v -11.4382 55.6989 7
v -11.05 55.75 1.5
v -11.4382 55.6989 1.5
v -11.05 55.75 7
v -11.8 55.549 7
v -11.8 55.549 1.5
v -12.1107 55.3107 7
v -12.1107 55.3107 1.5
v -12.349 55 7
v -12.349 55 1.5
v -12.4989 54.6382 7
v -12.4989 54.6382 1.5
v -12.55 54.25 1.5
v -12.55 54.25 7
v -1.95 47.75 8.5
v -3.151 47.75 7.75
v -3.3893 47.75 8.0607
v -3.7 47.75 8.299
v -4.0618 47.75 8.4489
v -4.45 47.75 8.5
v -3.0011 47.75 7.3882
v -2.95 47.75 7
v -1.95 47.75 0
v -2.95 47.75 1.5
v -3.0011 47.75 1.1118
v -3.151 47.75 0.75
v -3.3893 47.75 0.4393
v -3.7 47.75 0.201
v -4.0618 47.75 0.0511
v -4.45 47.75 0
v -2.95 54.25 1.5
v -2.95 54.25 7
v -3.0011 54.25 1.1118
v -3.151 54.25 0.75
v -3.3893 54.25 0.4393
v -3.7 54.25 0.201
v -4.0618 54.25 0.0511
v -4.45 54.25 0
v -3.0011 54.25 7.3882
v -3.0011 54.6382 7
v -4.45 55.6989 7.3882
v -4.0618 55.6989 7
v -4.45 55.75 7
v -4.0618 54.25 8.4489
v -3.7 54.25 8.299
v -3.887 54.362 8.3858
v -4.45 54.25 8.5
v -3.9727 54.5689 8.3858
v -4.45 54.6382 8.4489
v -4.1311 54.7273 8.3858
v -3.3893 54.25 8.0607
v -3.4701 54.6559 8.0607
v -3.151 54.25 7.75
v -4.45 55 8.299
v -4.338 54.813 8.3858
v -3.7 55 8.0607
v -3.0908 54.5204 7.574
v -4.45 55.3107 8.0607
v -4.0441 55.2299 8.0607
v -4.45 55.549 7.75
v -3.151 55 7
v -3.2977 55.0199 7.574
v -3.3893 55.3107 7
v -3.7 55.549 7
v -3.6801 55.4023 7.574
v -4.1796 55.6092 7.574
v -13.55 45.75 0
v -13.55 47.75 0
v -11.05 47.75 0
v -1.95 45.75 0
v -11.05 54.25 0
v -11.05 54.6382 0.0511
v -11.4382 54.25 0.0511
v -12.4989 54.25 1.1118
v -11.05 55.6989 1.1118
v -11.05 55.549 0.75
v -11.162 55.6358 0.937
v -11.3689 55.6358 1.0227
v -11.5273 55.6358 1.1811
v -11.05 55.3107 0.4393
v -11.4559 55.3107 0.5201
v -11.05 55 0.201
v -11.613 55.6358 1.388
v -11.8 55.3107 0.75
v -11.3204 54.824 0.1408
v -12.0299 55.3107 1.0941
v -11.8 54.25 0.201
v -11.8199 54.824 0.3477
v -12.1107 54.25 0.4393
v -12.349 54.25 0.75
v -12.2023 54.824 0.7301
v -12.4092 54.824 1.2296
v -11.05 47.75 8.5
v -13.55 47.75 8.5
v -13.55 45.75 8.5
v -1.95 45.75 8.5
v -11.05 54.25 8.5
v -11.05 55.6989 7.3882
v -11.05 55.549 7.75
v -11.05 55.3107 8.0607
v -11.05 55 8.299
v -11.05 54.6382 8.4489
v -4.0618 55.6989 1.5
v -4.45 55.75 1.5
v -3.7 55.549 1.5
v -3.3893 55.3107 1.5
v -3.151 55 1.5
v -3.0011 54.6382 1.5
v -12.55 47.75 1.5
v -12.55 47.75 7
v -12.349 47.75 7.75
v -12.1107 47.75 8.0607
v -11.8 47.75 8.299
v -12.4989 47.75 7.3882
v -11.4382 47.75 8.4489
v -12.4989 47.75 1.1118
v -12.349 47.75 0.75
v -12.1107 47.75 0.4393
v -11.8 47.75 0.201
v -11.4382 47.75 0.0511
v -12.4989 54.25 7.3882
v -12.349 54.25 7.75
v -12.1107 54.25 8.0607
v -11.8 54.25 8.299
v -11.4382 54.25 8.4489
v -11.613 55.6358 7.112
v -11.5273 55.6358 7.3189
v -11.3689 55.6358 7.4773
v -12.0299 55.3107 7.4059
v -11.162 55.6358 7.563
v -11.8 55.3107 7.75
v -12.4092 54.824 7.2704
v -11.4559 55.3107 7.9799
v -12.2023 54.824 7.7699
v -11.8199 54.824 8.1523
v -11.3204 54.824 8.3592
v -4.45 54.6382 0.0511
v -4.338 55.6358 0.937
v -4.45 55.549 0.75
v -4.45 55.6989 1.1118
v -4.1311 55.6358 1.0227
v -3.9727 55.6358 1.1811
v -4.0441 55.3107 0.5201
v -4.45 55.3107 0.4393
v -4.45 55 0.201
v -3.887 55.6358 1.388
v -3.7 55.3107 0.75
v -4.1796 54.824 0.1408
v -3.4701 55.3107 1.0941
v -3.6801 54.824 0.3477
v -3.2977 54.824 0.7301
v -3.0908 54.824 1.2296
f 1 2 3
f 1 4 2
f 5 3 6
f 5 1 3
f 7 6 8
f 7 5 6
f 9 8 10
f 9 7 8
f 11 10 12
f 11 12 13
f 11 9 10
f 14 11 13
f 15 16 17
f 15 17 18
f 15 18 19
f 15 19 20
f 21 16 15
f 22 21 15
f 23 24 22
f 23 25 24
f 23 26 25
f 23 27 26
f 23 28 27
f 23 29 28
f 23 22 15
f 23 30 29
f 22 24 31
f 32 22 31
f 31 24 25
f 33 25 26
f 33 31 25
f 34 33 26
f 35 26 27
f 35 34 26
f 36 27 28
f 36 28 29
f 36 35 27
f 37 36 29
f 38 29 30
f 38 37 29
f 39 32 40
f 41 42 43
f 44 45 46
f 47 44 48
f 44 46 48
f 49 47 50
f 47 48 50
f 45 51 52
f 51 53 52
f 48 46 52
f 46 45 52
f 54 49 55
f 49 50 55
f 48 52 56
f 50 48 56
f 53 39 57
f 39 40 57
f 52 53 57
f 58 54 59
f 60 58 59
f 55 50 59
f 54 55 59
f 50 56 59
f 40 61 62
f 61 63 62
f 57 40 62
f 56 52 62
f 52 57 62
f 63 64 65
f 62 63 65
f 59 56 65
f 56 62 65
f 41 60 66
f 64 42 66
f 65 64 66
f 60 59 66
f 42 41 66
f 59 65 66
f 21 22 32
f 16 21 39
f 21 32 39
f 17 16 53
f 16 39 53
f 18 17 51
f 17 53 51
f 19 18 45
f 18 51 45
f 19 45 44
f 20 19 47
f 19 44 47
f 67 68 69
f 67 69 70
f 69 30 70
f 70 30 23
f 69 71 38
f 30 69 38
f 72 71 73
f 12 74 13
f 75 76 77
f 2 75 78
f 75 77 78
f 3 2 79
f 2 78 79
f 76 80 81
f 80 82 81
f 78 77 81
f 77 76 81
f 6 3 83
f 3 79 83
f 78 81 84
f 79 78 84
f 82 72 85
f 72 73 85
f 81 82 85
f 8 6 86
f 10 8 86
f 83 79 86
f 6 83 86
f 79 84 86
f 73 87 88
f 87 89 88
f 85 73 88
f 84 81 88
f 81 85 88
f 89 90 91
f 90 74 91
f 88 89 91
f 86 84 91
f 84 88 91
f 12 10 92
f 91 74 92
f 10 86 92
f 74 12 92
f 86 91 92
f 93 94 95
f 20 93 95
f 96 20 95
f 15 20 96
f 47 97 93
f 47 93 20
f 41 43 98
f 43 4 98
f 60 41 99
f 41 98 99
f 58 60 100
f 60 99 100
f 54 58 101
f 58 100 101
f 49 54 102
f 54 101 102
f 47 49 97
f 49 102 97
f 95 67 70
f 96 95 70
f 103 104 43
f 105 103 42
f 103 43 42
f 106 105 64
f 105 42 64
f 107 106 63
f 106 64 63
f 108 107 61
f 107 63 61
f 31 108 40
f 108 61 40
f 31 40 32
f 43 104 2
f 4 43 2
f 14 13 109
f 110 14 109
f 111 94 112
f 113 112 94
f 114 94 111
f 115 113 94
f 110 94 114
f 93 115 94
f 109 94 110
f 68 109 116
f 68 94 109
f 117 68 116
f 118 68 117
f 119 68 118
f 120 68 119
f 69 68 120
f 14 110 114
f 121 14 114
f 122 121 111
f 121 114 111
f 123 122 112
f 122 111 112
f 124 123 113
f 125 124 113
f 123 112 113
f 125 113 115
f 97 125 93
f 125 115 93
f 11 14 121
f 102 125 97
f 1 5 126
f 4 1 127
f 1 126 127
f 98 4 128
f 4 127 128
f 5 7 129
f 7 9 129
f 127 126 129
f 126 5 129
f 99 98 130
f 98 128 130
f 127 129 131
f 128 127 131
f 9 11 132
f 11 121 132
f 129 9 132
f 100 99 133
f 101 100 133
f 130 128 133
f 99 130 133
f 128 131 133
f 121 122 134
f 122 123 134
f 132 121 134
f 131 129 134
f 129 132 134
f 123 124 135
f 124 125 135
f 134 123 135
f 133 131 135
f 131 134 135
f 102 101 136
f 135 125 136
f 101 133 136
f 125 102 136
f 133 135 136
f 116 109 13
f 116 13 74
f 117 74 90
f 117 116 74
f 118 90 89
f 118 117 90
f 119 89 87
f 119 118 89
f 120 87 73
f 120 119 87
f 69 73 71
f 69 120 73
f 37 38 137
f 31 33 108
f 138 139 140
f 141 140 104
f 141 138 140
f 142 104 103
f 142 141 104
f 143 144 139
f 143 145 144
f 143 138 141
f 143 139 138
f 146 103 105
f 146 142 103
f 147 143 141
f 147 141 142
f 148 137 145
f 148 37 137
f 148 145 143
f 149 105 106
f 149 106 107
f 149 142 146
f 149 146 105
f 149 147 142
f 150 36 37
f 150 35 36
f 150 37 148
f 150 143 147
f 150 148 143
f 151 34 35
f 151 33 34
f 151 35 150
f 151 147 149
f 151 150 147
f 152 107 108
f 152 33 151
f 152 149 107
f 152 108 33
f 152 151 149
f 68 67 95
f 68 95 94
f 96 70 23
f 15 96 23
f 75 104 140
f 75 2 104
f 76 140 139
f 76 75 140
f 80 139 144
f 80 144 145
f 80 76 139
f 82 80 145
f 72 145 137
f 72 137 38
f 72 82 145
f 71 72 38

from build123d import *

# Parameters (mm, degrees)
SKETCH2_W           = 1
SKETCH2_H           = 2
BOSS_EXTRUDE1_DEPTH = 8.5
FILLET1_R           = 1.5


with BuildPart() as part:
    # Sketch2 → Boss-Extrude1 (new body)
    with BuildSketch(Plane.XY):
        Polygon((-2.95, 55.75), (-7.75, 55.75), (-7.75, 45.75), (-2.95, 45.75), (-2.95, 47.75), align=None)
        Polygon((-7.75, 55.75), (-12.55, 55.75), (-12.55, 47.75), (-12.55, 45.75), (-7.75, 45.75), align=None)
        with Locations((-2.45, 46.75)):
            Rectangle(SKETCH2_W, SKETCH2_H)
        with Locations((-13.05, 46.75)):
            Rectangle(SKETCH2_W, SKETCH2_H)
    extrude(amount=BOSS_EXTRUDE1_DEPTH)

    # Fillet1
    fillet1_edges = [part.edges().sort_by_distance(p)[0] for p in [
        (-2.95, 51.75, 0),
        (-12.55, 51.75, 8.5),
        (-12.55, 51.75, 0),
        (-7.75, 55.75, 0),
        (-2.95, 55.75, 4.25),
        (-12.55, 55.75, 4.25),
        (-2.95, 51.75, 8.5),
        (-7.75, 55.75, 8.5),
    ]]
    fillet(fillet1_edges, radius=FILLET1_R)


solid = part.part
